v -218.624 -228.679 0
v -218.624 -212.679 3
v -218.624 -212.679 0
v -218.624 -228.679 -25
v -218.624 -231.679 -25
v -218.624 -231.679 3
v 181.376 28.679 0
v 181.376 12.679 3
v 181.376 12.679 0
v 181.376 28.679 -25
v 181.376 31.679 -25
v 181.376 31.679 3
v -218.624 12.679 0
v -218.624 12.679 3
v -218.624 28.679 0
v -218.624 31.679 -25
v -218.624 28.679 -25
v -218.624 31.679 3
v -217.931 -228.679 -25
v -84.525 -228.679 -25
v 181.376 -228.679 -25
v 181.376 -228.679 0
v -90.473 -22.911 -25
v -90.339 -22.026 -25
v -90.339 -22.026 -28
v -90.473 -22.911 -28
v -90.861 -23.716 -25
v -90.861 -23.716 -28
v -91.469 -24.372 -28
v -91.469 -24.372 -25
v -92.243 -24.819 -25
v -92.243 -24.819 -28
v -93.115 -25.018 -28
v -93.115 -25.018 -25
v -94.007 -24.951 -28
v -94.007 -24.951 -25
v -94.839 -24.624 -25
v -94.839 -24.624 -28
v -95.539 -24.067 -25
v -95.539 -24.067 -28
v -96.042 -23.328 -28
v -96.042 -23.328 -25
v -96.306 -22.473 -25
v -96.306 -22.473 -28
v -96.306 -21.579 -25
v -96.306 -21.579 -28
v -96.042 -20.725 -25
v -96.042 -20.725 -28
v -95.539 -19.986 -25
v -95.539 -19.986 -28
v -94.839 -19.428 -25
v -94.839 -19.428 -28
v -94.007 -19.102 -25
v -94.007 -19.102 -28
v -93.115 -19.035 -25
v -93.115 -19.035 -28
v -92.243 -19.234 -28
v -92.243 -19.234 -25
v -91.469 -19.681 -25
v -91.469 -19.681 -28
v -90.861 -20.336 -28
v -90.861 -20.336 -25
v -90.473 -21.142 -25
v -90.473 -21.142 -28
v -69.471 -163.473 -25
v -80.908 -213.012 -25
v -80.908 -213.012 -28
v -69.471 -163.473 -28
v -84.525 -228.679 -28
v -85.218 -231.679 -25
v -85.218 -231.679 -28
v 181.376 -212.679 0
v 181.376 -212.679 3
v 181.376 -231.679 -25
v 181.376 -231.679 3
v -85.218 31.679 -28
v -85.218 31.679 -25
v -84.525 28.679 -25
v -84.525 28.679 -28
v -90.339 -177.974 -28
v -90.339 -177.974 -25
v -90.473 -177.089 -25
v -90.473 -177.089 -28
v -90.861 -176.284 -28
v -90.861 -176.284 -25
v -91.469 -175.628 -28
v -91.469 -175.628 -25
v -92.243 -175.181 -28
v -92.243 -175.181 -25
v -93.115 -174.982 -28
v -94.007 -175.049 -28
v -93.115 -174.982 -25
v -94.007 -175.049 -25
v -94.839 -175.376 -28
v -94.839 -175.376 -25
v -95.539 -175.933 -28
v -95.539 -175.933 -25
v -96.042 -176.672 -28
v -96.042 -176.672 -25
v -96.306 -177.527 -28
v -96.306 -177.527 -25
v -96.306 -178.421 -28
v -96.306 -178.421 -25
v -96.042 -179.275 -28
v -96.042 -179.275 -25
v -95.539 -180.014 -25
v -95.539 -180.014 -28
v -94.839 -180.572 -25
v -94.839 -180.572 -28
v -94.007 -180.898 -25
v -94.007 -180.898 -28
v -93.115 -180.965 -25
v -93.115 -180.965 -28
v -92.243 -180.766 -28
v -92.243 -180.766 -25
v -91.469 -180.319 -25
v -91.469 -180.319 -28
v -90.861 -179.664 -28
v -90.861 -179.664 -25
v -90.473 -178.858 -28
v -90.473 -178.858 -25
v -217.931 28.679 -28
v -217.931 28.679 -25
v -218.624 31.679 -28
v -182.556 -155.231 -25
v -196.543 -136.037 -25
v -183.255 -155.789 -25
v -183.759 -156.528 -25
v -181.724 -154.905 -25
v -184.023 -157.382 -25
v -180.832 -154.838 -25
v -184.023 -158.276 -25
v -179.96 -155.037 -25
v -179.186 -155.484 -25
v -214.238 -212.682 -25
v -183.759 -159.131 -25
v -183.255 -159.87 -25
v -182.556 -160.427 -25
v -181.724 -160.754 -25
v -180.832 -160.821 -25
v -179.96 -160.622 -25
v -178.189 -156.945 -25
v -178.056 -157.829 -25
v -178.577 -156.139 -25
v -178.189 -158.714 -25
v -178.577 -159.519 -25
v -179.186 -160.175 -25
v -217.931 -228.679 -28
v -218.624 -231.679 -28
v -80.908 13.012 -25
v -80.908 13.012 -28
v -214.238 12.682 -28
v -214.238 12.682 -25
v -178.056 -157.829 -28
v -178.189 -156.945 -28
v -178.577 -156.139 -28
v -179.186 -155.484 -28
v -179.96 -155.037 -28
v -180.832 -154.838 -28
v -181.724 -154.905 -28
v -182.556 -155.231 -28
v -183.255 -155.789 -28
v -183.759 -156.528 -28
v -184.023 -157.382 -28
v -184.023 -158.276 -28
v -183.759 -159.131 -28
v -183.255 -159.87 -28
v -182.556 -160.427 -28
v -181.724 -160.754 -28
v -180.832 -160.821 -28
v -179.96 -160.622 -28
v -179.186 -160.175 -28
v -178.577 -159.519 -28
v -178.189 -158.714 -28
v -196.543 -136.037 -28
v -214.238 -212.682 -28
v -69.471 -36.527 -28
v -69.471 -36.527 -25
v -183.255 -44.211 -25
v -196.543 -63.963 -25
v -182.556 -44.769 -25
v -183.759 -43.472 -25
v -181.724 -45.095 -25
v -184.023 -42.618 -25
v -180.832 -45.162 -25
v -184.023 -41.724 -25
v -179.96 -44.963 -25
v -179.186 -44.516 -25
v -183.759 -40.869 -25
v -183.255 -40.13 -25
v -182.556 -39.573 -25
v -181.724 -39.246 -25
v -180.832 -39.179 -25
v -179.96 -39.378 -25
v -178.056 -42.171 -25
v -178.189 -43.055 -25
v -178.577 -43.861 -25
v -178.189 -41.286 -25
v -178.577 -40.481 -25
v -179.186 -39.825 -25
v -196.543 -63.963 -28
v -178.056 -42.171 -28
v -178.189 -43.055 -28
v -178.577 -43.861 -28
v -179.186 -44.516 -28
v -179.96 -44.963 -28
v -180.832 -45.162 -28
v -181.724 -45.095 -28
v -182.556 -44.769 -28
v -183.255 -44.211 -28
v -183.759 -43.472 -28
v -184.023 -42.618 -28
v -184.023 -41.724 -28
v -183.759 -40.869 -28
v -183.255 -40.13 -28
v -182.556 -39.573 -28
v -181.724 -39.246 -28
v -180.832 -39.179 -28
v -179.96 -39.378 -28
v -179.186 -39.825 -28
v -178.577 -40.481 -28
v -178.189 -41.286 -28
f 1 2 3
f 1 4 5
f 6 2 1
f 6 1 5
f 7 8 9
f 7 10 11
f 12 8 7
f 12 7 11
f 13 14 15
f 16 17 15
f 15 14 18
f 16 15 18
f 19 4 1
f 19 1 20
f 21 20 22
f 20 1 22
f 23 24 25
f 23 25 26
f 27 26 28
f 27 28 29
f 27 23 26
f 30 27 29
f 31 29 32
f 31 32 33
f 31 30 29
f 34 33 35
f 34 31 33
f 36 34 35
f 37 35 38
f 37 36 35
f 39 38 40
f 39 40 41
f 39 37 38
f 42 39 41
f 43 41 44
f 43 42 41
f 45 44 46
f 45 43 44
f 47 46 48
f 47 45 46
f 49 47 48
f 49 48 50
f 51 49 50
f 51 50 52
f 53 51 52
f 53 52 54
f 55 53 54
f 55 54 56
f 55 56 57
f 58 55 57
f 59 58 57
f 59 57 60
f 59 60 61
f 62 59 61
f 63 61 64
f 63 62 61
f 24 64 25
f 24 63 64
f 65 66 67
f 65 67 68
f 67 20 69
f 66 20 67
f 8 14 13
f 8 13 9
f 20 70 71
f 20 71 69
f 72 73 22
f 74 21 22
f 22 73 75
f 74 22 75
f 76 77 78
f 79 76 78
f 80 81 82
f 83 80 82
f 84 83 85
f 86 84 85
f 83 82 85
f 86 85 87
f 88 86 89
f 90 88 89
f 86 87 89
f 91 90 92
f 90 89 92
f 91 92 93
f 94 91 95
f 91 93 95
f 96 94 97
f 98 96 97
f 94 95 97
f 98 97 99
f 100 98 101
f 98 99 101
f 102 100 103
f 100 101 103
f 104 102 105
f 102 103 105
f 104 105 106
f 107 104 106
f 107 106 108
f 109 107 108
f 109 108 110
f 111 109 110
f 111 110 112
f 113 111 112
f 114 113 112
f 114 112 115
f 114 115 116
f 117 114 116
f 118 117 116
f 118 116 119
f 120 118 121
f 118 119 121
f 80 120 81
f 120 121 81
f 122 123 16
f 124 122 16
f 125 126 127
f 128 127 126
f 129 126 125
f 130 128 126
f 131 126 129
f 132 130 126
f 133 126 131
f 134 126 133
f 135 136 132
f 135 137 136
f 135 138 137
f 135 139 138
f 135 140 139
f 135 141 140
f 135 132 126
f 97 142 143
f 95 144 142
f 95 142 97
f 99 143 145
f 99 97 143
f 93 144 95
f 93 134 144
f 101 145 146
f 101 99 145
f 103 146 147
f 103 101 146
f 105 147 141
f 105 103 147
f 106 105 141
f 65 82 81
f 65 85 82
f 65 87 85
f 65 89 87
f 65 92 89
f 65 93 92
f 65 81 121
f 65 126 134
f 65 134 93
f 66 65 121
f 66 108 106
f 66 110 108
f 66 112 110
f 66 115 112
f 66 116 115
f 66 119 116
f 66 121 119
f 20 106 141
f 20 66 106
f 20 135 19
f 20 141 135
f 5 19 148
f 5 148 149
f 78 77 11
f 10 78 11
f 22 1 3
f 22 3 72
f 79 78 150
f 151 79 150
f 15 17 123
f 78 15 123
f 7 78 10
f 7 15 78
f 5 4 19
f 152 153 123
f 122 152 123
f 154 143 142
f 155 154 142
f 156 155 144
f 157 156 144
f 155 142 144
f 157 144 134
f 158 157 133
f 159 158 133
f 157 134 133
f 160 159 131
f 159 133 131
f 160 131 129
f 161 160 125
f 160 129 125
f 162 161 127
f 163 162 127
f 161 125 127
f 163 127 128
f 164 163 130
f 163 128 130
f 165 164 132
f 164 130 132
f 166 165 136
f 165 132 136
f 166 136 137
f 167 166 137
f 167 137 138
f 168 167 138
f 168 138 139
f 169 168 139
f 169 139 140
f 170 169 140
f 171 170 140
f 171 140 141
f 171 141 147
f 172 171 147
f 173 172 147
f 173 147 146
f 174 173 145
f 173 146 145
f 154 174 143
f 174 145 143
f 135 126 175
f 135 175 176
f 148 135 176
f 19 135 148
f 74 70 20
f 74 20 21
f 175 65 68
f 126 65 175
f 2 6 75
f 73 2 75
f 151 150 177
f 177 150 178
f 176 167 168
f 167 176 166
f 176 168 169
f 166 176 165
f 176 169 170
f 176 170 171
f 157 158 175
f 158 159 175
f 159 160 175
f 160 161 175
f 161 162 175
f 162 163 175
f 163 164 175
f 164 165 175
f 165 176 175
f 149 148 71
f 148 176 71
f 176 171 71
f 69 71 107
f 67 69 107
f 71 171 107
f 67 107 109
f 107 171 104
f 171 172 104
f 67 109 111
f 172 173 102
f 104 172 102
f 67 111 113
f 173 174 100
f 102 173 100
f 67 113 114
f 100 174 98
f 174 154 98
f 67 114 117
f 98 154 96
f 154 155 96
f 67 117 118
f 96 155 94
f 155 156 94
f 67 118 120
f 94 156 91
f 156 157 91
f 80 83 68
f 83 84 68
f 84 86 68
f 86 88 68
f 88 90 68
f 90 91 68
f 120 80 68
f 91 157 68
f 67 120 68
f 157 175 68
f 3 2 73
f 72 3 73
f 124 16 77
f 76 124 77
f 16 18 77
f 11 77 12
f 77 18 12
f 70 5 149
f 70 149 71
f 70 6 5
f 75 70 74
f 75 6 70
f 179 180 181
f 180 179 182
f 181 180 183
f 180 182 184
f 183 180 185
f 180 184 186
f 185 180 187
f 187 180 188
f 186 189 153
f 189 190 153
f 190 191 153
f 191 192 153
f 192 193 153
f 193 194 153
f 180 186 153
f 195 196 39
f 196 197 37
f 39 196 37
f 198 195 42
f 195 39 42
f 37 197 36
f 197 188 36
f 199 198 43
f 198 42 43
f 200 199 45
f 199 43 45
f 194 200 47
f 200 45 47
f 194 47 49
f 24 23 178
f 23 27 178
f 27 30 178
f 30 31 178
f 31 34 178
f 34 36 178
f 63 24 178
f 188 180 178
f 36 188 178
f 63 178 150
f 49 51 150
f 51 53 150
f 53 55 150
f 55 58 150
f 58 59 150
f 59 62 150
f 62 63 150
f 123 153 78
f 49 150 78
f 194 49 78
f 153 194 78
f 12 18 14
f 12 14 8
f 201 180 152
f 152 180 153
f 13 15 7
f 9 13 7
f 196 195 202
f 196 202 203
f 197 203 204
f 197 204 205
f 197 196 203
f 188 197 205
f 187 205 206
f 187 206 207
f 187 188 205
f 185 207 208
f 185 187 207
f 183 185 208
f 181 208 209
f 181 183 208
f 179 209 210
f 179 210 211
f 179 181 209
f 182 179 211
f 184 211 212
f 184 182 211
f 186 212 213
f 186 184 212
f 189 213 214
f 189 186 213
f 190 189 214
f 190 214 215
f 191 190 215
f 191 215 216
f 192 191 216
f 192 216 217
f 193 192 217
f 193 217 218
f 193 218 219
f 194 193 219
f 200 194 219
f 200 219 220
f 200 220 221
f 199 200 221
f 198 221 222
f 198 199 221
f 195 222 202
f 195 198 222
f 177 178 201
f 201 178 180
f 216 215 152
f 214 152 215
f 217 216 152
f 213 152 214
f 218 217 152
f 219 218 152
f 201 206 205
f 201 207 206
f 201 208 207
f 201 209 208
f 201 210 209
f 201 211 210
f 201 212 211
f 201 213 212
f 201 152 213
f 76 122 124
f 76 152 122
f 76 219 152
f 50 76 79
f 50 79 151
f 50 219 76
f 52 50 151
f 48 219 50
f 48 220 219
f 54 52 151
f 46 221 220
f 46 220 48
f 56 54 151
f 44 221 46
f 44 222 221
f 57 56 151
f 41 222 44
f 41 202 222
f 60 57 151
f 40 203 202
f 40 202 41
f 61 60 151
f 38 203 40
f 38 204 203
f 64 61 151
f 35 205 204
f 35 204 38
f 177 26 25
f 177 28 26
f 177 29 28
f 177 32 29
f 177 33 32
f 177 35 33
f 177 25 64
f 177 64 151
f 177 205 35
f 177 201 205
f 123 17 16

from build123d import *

# Parameters (mm, degrees)
F0_W     = 400
F0_H     = 3
F1_DEPTH = 3
F3_DEPTH = 25
F4_W     = 400
F4_H     = 3
F5_DEPTH = 28
F6_R     = 3
F7_DEPTH = 3
F8_W     = 3
F8_H     = 25
F9_DEPTH = 400.001


# Not quite as in the source:
# - a feature names something its author has since deleted; it is built from what else it names


with BuildPart() as f1:
    # F0 (on Top) → F1 (new body)
    with BuildSketch(Plane.XY):
        Polygon((-18.623991464, 31.679145366), (-218.623991464, 31.679145366), (-218.623991464, 15.679145366), (181.376008536, 15.679145366), (181.376008536, 31.679145366), align=None)
        with Locations((-18.623991464, 14.179145366)):
            Rectangle(F0_W, F0_H)
    extrude(amount=F1_DEPTH)

    # F0 (on Top) → F3 (join)
    with BuildSketch(Plane.XY):
        with Locations((-18.623991464, 14.179145366)):
            Rectangle(F0_W, F0_H)
    extrude(amount=-F3_DEPTH)

    # F4 (on face) → F5 (join)
    with BuildSketch(Plane.XY.offset(3)):
        with Locations((-18.623991464, 30.179145366)):
            Rectangle(F4_W, F4_H)
    extrude(amount=-F5_DEPTH)

    # F6 (on face) → F7 (join)
    with BuildSketch(Plane(origin=(0, 0, -25), x_dir=(1, 0, 0), z_dir=(0, 0, -1))):
        Polygon((-84.5253868028, -28.679145366), (-217.9313868906, -28.679145366), (-218.623991464, -31.679145366), (-85.2179913762, -31.679145366), align=None)
        Polygon((-69.4714175721, 36.526759169), (-196.5431985444, 63.9632764502), (-214.2380493628, -12.6815429686), (-217.9313868906, -28.679145366), (-84.5253868028, -28.679145366), (-80.9082856553, -13.0117590105), align=None)
        with Locations((-93.339475505, 22.0263727619)):
            Circle(F6_R, mode=Mode.SUBTRACT)
        with Locations((-181.0561138573, 42.1706363664)):
            Circle(F6_R, mode=Mode.SUBTRACT)
    extrude(amount=F7_DEPTH)

    # F8 (on face) → F9 (cut, through all)
    with BuildSketch(Plane.YZ.offset(181.376008536)):
        with Locations((14.179145366, -12.5)):
            Rectangle(F8_W, F8_H)
    extrude(amount=-F9_DEPTH, mode=Mode.SUBTRACT)


with BuildPart() as f10_1:
    # F10: instance of F1
    add(f1.part.mirror(Plane.XZ.offset(100)))


solid = Compound([f1.part, f10_1.part])
